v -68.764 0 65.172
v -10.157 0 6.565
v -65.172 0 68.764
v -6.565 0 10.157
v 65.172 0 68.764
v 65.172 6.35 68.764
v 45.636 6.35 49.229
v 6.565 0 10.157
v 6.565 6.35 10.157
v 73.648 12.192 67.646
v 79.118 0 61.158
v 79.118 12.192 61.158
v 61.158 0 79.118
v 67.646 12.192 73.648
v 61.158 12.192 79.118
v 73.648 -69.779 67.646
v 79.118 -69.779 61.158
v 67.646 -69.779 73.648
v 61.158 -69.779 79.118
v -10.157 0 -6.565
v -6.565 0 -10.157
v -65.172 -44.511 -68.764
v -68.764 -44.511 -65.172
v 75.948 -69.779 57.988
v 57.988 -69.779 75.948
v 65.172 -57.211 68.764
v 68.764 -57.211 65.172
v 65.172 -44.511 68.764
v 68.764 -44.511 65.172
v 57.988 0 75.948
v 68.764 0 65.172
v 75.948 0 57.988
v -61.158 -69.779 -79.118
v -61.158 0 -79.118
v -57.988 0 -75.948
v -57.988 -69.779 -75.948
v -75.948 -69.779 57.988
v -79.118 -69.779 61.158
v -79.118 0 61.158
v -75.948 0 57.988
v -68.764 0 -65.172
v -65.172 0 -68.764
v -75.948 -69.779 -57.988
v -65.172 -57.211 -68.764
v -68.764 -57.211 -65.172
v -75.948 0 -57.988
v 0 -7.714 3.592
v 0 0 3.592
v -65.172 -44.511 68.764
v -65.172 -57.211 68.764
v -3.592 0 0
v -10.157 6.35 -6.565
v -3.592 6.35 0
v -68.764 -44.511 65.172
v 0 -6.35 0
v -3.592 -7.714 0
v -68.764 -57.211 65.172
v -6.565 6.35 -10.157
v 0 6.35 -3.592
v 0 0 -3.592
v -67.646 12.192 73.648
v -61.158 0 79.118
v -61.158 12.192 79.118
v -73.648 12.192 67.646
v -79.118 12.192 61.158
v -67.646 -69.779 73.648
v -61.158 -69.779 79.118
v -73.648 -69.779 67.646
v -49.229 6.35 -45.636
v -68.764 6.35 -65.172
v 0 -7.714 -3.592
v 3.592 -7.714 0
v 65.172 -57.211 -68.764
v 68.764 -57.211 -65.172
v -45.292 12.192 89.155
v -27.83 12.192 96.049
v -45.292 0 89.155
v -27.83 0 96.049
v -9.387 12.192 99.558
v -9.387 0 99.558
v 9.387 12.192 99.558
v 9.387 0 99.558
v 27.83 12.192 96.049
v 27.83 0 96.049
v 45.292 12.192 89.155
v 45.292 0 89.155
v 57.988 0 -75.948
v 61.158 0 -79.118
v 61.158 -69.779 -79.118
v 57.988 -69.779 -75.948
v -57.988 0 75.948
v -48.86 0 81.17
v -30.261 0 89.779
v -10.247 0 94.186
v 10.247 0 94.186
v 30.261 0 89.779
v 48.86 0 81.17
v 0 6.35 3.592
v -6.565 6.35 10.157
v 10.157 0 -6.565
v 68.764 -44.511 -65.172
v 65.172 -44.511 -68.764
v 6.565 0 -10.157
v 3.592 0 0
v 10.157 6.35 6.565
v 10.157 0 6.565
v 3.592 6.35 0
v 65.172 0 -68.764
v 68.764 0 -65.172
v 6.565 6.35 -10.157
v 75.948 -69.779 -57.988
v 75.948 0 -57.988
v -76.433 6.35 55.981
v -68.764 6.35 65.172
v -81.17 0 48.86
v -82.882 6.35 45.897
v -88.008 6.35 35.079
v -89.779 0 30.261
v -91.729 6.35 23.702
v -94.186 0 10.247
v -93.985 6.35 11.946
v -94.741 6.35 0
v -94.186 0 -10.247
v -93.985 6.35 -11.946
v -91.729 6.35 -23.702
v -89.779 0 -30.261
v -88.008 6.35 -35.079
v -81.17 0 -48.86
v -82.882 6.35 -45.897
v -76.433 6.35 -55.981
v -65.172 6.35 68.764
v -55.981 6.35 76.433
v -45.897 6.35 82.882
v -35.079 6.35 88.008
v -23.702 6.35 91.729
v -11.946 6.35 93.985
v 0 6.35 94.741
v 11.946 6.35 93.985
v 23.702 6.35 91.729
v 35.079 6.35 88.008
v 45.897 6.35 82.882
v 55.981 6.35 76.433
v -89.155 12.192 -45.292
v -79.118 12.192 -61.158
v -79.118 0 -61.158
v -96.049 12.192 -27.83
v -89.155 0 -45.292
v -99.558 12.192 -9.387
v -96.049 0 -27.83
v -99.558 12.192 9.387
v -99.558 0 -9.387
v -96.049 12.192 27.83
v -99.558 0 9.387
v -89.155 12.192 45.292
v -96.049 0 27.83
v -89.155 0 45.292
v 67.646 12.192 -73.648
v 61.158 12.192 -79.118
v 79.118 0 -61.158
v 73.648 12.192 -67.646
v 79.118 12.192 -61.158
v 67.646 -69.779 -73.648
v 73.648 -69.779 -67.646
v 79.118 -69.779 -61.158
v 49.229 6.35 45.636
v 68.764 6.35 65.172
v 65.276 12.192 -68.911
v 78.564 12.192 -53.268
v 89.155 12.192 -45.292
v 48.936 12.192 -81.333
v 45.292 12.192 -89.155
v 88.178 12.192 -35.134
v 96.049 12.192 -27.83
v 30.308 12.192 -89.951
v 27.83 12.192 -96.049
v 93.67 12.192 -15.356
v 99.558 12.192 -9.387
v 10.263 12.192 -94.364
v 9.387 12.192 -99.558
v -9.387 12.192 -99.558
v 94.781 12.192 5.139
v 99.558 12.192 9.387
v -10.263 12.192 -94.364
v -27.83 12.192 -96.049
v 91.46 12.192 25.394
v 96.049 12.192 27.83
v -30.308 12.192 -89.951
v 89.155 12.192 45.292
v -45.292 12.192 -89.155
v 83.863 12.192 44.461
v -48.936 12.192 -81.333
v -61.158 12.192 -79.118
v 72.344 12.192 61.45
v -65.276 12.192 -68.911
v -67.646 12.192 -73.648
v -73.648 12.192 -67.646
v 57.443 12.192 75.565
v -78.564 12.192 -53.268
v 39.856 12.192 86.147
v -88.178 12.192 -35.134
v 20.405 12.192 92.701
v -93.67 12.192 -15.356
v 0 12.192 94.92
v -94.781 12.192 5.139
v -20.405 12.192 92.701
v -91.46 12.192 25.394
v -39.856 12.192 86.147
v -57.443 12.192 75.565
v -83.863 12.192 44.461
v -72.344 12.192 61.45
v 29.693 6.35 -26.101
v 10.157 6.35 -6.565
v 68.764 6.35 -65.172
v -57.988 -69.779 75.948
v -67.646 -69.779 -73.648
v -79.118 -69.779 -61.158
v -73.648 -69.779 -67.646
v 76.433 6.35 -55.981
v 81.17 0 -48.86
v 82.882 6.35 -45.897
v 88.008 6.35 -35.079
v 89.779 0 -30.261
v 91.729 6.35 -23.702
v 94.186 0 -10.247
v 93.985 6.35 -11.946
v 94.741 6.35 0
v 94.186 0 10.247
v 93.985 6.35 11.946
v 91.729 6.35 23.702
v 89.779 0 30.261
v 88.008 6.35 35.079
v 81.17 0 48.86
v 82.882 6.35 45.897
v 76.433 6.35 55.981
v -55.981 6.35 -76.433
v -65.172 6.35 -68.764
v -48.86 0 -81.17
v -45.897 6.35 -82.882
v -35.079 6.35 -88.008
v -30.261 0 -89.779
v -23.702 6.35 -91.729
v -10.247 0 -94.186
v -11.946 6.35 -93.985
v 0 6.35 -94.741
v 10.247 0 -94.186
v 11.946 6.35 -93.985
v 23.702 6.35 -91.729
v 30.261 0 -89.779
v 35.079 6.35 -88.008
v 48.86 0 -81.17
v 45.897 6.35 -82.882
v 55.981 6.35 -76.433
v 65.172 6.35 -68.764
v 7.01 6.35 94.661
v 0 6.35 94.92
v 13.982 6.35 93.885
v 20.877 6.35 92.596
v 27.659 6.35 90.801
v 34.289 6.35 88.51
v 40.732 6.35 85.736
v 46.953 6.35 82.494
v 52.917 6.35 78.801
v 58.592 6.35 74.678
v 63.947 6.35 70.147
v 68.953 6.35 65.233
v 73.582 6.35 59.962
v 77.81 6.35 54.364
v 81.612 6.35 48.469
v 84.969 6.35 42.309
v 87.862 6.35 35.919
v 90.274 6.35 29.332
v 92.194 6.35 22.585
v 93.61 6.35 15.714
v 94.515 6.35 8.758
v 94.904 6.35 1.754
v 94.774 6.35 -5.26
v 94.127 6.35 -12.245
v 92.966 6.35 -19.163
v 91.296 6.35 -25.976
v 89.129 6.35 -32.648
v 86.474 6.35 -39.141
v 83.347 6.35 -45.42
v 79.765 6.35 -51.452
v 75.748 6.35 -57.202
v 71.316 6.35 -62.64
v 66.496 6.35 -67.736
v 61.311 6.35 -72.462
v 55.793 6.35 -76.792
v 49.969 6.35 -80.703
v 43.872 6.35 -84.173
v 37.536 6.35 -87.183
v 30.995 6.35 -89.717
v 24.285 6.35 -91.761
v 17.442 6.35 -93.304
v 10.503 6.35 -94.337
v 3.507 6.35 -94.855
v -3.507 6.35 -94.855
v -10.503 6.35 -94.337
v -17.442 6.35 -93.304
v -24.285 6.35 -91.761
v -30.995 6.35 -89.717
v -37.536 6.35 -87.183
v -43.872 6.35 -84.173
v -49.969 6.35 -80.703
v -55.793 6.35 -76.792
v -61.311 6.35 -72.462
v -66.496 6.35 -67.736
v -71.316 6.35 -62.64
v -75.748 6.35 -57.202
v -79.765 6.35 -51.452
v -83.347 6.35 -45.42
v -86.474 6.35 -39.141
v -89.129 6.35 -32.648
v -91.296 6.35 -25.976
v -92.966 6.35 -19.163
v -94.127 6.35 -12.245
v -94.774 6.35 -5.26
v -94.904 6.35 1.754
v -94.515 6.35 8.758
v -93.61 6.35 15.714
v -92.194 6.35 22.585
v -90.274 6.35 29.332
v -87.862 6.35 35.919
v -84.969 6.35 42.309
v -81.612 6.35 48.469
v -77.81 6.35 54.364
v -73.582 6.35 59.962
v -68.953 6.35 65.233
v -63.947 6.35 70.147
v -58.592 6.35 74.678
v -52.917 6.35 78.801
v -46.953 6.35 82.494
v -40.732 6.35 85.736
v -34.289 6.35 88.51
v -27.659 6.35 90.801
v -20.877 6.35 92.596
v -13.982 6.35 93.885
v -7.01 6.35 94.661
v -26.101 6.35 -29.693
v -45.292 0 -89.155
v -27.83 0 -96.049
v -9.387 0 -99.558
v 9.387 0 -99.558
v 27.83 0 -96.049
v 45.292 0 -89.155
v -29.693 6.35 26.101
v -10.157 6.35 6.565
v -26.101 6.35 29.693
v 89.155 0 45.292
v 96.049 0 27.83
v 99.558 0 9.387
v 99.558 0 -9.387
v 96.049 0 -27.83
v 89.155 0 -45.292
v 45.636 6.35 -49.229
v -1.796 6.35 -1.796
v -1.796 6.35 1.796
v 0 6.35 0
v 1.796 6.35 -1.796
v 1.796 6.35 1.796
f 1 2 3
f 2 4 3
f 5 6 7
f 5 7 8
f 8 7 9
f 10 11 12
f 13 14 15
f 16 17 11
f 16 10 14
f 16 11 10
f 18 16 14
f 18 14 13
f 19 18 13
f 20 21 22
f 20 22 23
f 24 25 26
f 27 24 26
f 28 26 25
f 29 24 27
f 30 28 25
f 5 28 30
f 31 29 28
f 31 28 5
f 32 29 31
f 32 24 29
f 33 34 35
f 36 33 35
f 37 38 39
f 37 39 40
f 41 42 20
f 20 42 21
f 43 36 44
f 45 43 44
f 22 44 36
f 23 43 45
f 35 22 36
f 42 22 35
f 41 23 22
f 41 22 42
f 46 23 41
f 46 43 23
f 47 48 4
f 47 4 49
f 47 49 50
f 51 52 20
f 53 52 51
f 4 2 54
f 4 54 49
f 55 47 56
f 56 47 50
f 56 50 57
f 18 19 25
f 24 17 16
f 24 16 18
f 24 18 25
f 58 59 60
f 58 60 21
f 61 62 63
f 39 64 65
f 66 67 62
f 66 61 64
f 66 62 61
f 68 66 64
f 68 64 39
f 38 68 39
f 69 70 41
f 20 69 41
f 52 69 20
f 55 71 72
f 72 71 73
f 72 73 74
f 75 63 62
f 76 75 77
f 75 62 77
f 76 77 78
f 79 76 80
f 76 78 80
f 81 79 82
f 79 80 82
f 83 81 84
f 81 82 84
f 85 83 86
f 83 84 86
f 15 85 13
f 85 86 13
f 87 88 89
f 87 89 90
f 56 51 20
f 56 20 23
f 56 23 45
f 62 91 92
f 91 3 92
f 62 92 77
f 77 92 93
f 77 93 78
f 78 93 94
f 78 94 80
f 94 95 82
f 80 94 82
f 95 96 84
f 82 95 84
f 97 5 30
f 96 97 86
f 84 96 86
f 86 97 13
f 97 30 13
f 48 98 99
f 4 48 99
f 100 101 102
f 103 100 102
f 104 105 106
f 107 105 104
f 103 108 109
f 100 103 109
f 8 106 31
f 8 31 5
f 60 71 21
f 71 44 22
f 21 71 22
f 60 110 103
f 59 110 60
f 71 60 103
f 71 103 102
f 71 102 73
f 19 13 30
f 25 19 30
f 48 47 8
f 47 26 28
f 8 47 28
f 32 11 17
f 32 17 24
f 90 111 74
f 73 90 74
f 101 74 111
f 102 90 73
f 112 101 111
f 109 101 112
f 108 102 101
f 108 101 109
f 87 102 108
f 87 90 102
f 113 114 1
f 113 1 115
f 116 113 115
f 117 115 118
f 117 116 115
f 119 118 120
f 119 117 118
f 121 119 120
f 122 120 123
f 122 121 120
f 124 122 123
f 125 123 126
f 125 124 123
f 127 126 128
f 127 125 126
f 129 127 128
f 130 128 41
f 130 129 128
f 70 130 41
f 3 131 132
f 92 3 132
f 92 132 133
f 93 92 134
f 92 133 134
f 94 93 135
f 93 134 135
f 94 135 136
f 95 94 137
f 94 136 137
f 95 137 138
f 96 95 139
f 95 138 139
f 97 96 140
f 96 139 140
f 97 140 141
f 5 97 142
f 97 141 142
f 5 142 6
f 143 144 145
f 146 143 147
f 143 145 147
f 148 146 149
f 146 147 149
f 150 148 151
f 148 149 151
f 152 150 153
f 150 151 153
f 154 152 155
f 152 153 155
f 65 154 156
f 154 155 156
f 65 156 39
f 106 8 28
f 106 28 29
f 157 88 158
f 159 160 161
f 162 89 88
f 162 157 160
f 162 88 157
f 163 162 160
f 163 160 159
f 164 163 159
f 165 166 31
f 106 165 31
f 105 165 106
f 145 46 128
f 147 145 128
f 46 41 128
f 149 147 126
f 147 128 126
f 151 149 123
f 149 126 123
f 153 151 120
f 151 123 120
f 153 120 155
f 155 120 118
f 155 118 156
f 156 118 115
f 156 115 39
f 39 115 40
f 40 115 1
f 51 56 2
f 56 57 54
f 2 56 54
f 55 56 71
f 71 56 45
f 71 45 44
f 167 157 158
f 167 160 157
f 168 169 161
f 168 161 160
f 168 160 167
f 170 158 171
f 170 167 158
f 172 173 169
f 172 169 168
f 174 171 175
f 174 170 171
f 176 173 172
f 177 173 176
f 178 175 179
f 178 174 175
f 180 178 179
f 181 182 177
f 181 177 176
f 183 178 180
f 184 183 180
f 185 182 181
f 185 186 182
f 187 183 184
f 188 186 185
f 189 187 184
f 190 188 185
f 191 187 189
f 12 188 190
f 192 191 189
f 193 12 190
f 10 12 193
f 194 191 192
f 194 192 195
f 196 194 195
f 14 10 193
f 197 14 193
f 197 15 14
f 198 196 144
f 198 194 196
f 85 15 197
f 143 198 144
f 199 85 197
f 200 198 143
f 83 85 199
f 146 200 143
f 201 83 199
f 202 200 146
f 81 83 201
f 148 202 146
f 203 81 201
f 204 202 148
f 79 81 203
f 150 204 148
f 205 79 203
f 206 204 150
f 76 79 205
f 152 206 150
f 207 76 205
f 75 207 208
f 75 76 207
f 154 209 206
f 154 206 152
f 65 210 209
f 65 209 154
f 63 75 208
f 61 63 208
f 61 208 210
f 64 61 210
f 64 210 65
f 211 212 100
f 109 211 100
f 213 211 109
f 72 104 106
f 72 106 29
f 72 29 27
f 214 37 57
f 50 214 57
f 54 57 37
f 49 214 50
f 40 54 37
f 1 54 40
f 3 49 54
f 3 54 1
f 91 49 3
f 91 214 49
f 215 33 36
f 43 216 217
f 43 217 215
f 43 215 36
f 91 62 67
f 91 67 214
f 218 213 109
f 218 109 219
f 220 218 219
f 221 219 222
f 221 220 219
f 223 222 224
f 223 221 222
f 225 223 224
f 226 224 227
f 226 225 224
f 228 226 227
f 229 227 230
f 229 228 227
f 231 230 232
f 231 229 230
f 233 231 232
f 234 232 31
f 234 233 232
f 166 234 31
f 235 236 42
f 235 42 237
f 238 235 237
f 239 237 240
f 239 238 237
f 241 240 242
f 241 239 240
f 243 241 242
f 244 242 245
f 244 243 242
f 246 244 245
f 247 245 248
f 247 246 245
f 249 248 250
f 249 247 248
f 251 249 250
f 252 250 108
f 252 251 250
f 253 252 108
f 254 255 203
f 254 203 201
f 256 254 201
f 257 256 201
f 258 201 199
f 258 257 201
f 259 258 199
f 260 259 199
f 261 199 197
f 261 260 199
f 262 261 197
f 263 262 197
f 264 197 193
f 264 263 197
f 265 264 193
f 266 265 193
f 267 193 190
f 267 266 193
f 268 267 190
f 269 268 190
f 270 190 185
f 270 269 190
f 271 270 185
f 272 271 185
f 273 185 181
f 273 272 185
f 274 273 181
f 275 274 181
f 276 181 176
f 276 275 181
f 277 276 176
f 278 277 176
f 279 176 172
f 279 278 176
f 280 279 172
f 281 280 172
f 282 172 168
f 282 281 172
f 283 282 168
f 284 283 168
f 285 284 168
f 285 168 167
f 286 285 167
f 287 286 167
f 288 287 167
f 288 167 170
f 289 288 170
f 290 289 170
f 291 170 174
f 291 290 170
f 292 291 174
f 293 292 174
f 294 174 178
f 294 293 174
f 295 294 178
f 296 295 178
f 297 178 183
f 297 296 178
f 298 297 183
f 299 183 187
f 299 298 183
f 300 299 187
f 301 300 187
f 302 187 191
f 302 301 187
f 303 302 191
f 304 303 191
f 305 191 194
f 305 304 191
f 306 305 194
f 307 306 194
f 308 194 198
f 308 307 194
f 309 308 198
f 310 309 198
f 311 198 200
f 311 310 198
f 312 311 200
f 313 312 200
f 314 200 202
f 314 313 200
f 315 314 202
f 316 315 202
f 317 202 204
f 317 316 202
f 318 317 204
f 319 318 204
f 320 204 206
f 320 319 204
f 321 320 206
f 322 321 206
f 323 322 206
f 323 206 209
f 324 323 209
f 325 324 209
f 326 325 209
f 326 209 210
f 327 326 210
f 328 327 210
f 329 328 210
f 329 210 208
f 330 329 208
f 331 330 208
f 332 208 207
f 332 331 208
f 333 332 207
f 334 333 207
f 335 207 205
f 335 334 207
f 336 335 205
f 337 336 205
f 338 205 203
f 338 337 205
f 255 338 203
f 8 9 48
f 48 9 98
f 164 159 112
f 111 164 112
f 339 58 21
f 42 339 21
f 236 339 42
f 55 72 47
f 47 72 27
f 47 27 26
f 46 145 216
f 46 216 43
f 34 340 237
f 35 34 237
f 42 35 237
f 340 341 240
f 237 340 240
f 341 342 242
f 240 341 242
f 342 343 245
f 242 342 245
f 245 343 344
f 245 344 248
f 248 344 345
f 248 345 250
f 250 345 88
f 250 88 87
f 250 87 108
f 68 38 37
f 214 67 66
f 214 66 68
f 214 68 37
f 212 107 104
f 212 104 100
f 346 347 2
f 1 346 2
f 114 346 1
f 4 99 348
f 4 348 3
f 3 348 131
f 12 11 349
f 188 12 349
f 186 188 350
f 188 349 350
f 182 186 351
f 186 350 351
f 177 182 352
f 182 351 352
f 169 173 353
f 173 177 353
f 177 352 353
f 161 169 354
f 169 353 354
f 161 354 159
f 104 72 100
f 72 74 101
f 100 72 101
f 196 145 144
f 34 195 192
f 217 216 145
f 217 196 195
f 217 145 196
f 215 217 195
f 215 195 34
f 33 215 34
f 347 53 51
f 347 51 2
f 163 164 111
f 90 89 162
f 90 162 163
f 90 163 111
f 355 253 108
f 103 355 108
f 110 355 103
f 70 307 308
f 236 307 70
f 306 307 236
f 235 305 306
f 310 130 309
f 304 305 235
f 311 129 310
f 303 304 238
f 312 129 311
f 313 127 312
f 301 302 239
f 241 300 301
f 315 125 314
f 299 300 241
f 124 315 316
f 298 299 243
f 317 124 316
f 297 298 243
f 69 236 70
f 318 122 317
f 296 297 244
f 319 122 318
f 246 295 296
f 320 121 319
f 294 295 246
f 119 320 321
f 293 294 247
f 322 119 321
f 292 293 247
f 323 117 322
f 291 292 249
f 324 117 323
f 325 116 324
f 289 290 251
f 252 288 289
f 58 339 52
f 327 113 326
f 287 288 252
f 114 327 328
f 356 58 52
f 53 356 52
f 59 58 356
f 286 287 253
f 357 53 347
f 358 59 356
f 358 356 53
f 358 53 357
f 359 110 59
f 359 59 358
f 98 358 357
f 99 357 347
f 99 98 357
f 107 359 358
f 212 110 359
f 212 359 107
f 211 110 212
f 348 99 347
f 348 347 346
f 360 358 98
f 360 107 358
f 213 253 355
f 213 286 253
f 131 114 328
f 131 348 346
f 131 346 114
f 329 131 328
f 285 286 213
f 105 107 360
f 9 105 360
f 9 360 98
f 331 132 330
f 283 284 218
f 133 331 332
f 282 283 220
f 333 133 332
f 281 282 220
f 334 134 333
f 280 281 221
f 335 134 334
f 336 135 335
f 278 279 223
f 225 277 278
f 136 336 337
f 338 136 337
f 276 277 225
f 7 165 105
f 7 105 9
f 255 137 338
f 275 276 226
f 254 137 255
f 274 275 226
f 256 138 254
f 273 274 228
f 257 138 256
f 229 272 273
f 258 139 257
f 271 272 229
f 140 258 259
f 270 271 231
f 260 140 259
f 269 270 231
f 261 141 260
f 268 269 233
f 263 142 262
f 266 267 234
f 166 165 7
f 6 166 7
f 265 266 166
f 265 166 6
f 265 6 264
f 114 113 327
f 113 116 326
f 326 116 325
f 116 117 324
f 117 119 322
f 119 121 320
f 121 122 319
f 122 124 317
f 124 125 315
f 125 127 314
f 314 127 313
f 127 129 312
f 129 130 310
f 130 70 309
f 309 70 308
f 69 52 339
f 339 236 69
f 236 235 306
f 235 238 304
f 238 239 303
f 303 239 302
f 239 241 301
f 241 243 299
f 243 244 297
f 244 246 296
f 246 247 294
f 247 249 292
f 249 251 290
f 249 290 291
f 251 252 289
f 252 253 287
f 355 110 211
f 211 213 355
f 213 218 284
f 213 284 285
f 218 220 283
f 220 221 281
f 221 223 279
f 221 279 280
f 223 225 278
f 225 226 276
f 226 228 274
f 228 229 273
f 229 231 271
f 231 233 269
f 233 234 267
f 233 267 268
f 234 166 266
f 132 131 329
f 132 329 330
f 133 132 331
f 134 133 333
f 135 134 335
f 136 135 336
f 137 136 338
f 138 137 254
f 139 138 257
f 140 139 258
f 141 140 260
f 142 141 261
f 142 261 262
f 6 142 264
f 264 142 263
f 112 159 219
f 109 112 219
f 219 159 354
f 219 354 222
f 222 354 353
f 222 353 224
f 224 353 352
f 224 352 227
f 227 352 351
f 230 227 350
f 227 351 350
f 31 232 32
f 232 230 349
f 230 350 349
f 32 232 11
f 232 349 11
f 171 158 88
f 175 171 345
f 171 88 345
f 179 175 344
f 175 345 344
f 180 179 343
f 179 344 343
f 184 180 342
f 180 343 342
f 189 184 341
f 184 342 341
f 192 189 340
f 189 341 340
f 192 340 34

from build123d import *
from build123d.topology import SkipClean

# Parameters (mm, degrees)
SKETCH1_R                = 100
BOSS_EXTRUDE1_DEPTH      = 6.35
BOSS_EXTRUDE2_DEPTH      = 14.986
BOSS_EXTRUDE2_DEPTH_BACK = 76.128786138
SKETCH3_R                = 100
SKETCH3_R_2              = 94.92
BOSS_EXTRUDE3_DEPTH      = 5.842
CIRPATTERN1_COUNT        = 4
SKETCH29_W               = 5.08
SKETCH29_H               = 12.7
BOSS_EXTRUDE4_DEPTH      = 6.35
CIRPATTERN2_COUNT        = 4
CUT_EXTRUDE3_DEPTH       = 6.35
CUT_EXTRUDE4_START       = -9.144
CUT_EXTRUDE4_DEPTH       = 9.144
CIRPATTERN3_COUNT        = 4
BOSS_EXTRUDE6_DEPTH      = 12.7
CIRPATTERN4_COUNT        = 4
SKETCH34_W               = 25.4
SKETCH34_H               = 132.842
CUT_EXTRUDE5_DEPTH       = 7.62
CIRPATTERN5_COUNT        = 4
CUT_EXTRUDE6_START       = -88.9
CUT_EXTRUDE6_DEPTH       = 88.9


with BuildPart() as part:
    # Sketch1 → Boss-Extrude1 (new body)
    with BuildSketch(Plane(origin=(0, 0, 0), x_dir=(1, 0, 0), z_dir=(0, 1, 0))):
        with Locations(Location((0, 0, 0), (0, 0, 270))):
            Circle(SKETCH1_R)
    extrude(amount=BOSS_EXTRUDE1_DEPTH)

    # Sketch2 → Boss-Extrude2 (add, two sides: drawn at the far end of the back side and taken through both)
    with BuildSketch(Plane(origin=(0, 6.35, 0), x_dir=(1, 0, 0), z_dir=(0, 1, 0)).offset(-BOSS_EXTRUDE2_DEPTH_BACK)):
        with BuildLine():
            Line((70.138113747, -88.098625989), (79.118369868, -79.118369868))
            Line((79.118369868, -79.118369868), (88.098625989, -70.138113747))
            Line((88.098625989, -70.138113747), (79.118369868, -61.157857626))
            ThreePointArc((79.118369868, -61.157857626), (70.710678119, -70.710678119), (61.157857626, -79.118369868))
            Line((61.157857626, -79.118369868), (70.138113747, -88.098625989))
        make_face()
        with BuildLine():
            ThreePointArc((61.157857626, 79.118369868), (70.710678119, 70.710678119), (79.118369868, 61.157857626))
            Line((79.118369868, 61.157857626), (88.098625989, 70.138113747))
            Line((88.098625989, 70.138113747), (79.118369868, 79.118369868))
            Line((79.118369868, 79.118369868), (70.138113747, 88.098625989))
            Line((70.138113747, 88.098625989), (61.157857626, 79.118369868))
        make_face()
        with BuildLine():
            Line((-88.098625989, 70.138113747), (-79.118369868, 61.157857626))
            ThreePointArc((-79.118369868, 61.157857626), (-70.710678119, 70.710678119), (-61.157857626, 79.118369868))
            Line((-61.157857626, 79.118369868), (-70.138113747, 88.098625989))
            Line((-70.138113747, 88.098625989), (-79.118369868, 79.118369868))
            Line((-79.118369868, 79.118369868), (-88.098625989, 70.138113747))
        make_face()
        with BuildLine():
            Line((-79.118369868, -61.157857626), (-88.098625989, -70.138113747))
            Line((-88.098625989, -70.138113747), (-79.118369868, -79.118369868))
            Line((-79.118369868, -79.118369868), (-70.138113747, -88.098625989))
            Line((-70.138113747, -88.098625989), (-61.157857626, -79.118369868))
            ThreePointArc((-61.157857626, -79.118369868), (-70.710678119, -70.710678119), (-79.118369868, -61.157857626))
        make_face()
    extrude(amount=BOSS_EXTRUDE2_DEPTH + BOSS_EXTRUDE2_DEPTH_BACK)

    # Sketch3 → Boss-Extrude3 (add)
    with BuildSketch(Plane(origin=(0, 6.35, 0), x_dir=(1, 0, 0), z_dir=(0, 1, 0))):
        Circle(SKETCH3_R)
        with Locations(Location((0, 0, 0), (0, 0, 270))):
            Circle(SKETCH3_R_2, mode=Mode.SUBTRACT)
    extrude(amount=BOSS_EXTRUDE3_DEPTH)

    # Sweep1: sweep along a curve in space
    with BuildLine() as sweep1_path:
        Line((0, 0, 0), (-70.138113747, -53.268786138, -70.138113747))
    # 3DSketch4 → Sweep1 (sweep)
    with BuildSketch(Plane(origin=(-68.342062523, -59.618786138, -71.934164971), x_dir=(-0.262612865719444, 0.9284766908852601, 0.262612865719444), z_dir=(0.7071067811865448, -1.540105097113694e-15, 0.7071067811865502))):
        Polygon((0, 0), (1.886664636, 4.71666159), (13.67831861, 0), (11.791653974, -4.71666159), align=None)
    sweep1 = sweep(path=sweep1_path.line)

    # CirPattern1: Sweep1 ×4 about axis
    cirpattern1_axis = Axis((0, 0, 0), (0, 1, 0))
    for i in range(1, CIRPATTERN1_COUNT):
        add(sweep1.rotate(cirpattern1_axis, i * 360 / CIRPATTERN1_COUNT))

    # Sketch29 → Boss-Extrude4 (add)
    with BuildSketch(Plane(origin=(70.138113747, 0, 70.138113747), x_dir=(0.7071067811865501, 0, -0.7071067811865449), z_dir=(0.7071067811865449, 0, 0.7071067811865501))):
        with Locations((0, -53.268786138)):
            Rectangle(SKETCH29_W, SKETCH29_H)
    boss_extrude4 = extrude(amount=BOSS_EXTRUDE4_DEPTH)

    # CirPattern2: Boss-Extrude4 ×4 about axis
    cirpattern2_axis = Axis((0, 0, 0), (0, 1, 0))
    for i in range(1, CIRPATTERN2_COUNT):
        add(boss_extrude4.rotate(cirpattern2_axis, i * 360 / CIRPATTERN2_COUNT))

    # Sketch30 → Cut-Extrude3 (cut)
    with BuildSketch(Plane(origin=(0, 6.35, 0), x_dir=(1, 0, 0), z_dir=(0, 1, 0))):
        with BuildLine():
            Line((-10.1569893, -6.564886852), (-68.764267193, -65.172164744))
            ThreePointArc((-68.764267193, -65.172164744), (-94.741413859, 0), (-68.764267193, 65.172164744))
            Line((-68.764267193, 65.172164744), (-10.1569893, 6.564886852))
            Line((-10.1569893, 6.564886852), (-3.592102448, 0))
            Line((-3.592102448, 0), (-10.1569893, -6.564886852))
        make_face()
        with BuildLine():
            Line((-6.564886852, -10.1569893), (-65.172164744, -68.764267193))
            ThreePointArc((-65.172164744, -68.764267193), (0, -94.741413859), (65.172164744, -68.764267193))
            Line((65.172164744, -68.764267193), (6.564886852, -10.1569893))
            Line((6.564886852, -10.1569893), (0, -3.592102448))
            Line((0, -3.592102448), (-6.564886852, -10.1569893))
        make_face()
        with BuildLine():
            Line((-6.564886852, 10.1569893), (-65.172164744, 68.764267193))
            ThreePointArc((-65.172164744, 68.764267193), (0, 94.741413859), (65.172164744, 68.764267193))
            Line((65.172164744, 68.764267193), (6.564886852, 10.1569893))
            Line((6.564886852, 10.1569893), (0, 3.592102448))
            Line((0, 3.592102448), (-6.564886852, 10.1569893))
        make_face()
        with BuildLine():
            Line((10.1569893, 6.564886852), (68.764267193, 65.172164744))
            ThreePointArc((68.764267193, 65.172164744), (94.741413859, 0), (68.764267193, -65.172164744))
            Line((68.764267193, -65.172164744), (10.1569893, -6.564886852))
            Line((10.1569893, -6.564886852), (3.592102448, 0))
            Line((3.592102448, 0), (10.1569893, 6.564886852))
        make_face()
    extrude(amount=-CUT_EXTRUDE3_DEPTH, mode=Mode.SUBTRACT)

    # Sketch32 → Cut-Extrude4 (cut)
    with BuildSketch(Plane(origin=(0, 21.336, 0), x_dir=(1, 0, 0), z_dir=(0, 1, 0)).offset(CUT_EXTRUDE4_START)):
        with BuildLine():
            Line((79.118369868, 61.157857626), (88.098625989, 70.138113747))
            Line((88.098625989, 70.138113747), (70.138113747, 88.098625989))
            Line((70.138113747, 88.098625989), (61.157857626, 79.118369868))
            ThreePointArc((61.157857626, 79.118369868), (70.710678119, 70.710678119), (79.118369868, 61.157857626))
        make_face()
    cut_extrude4 = extrude(amount=CUT_EXTRUDE4_DEPTH, mode=Mode.SUBTRACT)

    # CirPattern3: Cut-Extrude4 ×4 about axis
    cirpattern3_axis = Axis((0, 12.192, 0), (0, -1, 0))
    for i in range(1, CIRPATTERN3_COUNT):
        add(cut_extrude4.rotate(cirpattern3_axis, i * 360 / CIRPATTERN3_COUNT), mode=Mode.SUBTRACT)

    # Sketch33 → Boss-Extrude6 (add, symmetric)
    with BuildSketch(Plane(origin=(0, 0, 0), x_dir=(-0.7071067811865438, 0, -0.7071067811865513), z_dir=(0.7071067811865513, 0, -0.7071067811865438))):
        Polygon((-94.707359271, -49.941543909), (-94.707359271, 0), (-100, 0), (-100, -46.918786138), (-100, -69.778786138), (-99.1902717, -69.778786138), (-94.707359271, -69.778786138), (-94.707359271, -63.948606699), align=None)
    boss_extrude6 = extrude(amount=BOSS_EXTRUDE6_DEPTH, both=True)

    # CirPattern4: Boss-Extrude6 ×4 about axis
    cirpattern4_axis = Axis((0, 0, 0), (0, 1, 0))
    for i in range(1, CIRPATTERN4_COUNT):
        add(boss_extrude6.rotate(cirpattern4_axis, i * 360 / CIRPATTERN4_COUNT))

    # Sketch34 → Cut-Extrude5 (cut)
    with BuildSketch(Plane(origin=(79.118369868, 0, 79.118369868), x_dir=(0.7071067811865465, 0, -0.7071067811865486), z_dir=(0.7071067811865486, 0, 0.7071067811865465))):
        with Locations((0, -54.229)):
            Rectangle(SKETCH34_W, SKETCH34_H)
    cut_extrude5 = extrude(amount=-CUT_EXTRUDE5_DEPTH, mode=Mode.SUBTRACT)

    # CirPattern5: Cut-Extrude5 ×4 about axis
    cirpattern5_axis = Axis((0, 0, 0), (0, 1, 0))
    for i in range(1, CIRPATTERN5_COUNT):
        add(cut_extrude5.rotate(cirpattern5_axis, i * 360 / CIRPATTERN5_COUNT), mode=Mode.SUBTRACT)

    # Sketch35 → Cut-Extrude6 (cut)
    with SkipClean():  # the faces are left unmerged after this step: merging them gives an invalid solid
        with BuildSketch(Plane(origin=(0, 12.192, 0), x_dir=(1, 0, 0), z_dir=(0, 1, 0)).offset(CUT_EXTRUDE6_START)):
            with BuildLine():
                Line((-61.157857626, 79.118369868), (-64.749960074, 82.710472317))
                Line((-64.749960074, 82.710472317), (-82.710472317, 64.749960074))
                Line((-82.710472317, 64.749960074), (-79.118369868, 61.157857626))
                ThreePointArc((-79.118369868, 61.157857626), (-70.710678119, 70.710678119), (-61.157857626, 79.118369868))
            make_face()
            with BuildLine():
                Line((-64.749960074, -82.710472317), (-61.157857626, -79.118369868))
                ThreePointArc((-61.157857626, -79.118369868), (-70.710678119, -70.710678119), (-79.118369868, -61.157857626))
                Line((-79.118369868, -61.157857626), (-82.710472317, -64.749960074))
                Line((-82.710472317, -64.749960074), (-64.749960074, -82.710472317))
            make_face()
            with BuildLine():
                Line((61.157857626, -79.118369868), (64.749960074, -82.710472317))
                Line((64.749960074, -82.710472317), (82.710472317, -64.749960074))
                Line((82.710472317, -64.749960074), (79.118369868, -61.157857626))
                ThreePointArc((79.118369868, -61.157857626), (70.710678119, -70.710678119), (61.157857626, -79.118369868))
            make_face()
            with BuildLine():
                Line((79.118369868, 61.157857626), (82.710472317, 64.749960074))
                Line((82.710472317, 64.749960074), (64.749960074, 82.710472317))
                Line((64.749960074, 82.710472317), (61.157857626, 79.118369868))
                ThreePointArc((61.157857626, 79.118369868), (70.710678119, 70.710678119), (79.118369868, 61.157857626))
            make_face()
        extrude(amount=CUT_EXTRUDE6_DEPTH, mode=Mode.SUBTRACT)


solid = part.part
